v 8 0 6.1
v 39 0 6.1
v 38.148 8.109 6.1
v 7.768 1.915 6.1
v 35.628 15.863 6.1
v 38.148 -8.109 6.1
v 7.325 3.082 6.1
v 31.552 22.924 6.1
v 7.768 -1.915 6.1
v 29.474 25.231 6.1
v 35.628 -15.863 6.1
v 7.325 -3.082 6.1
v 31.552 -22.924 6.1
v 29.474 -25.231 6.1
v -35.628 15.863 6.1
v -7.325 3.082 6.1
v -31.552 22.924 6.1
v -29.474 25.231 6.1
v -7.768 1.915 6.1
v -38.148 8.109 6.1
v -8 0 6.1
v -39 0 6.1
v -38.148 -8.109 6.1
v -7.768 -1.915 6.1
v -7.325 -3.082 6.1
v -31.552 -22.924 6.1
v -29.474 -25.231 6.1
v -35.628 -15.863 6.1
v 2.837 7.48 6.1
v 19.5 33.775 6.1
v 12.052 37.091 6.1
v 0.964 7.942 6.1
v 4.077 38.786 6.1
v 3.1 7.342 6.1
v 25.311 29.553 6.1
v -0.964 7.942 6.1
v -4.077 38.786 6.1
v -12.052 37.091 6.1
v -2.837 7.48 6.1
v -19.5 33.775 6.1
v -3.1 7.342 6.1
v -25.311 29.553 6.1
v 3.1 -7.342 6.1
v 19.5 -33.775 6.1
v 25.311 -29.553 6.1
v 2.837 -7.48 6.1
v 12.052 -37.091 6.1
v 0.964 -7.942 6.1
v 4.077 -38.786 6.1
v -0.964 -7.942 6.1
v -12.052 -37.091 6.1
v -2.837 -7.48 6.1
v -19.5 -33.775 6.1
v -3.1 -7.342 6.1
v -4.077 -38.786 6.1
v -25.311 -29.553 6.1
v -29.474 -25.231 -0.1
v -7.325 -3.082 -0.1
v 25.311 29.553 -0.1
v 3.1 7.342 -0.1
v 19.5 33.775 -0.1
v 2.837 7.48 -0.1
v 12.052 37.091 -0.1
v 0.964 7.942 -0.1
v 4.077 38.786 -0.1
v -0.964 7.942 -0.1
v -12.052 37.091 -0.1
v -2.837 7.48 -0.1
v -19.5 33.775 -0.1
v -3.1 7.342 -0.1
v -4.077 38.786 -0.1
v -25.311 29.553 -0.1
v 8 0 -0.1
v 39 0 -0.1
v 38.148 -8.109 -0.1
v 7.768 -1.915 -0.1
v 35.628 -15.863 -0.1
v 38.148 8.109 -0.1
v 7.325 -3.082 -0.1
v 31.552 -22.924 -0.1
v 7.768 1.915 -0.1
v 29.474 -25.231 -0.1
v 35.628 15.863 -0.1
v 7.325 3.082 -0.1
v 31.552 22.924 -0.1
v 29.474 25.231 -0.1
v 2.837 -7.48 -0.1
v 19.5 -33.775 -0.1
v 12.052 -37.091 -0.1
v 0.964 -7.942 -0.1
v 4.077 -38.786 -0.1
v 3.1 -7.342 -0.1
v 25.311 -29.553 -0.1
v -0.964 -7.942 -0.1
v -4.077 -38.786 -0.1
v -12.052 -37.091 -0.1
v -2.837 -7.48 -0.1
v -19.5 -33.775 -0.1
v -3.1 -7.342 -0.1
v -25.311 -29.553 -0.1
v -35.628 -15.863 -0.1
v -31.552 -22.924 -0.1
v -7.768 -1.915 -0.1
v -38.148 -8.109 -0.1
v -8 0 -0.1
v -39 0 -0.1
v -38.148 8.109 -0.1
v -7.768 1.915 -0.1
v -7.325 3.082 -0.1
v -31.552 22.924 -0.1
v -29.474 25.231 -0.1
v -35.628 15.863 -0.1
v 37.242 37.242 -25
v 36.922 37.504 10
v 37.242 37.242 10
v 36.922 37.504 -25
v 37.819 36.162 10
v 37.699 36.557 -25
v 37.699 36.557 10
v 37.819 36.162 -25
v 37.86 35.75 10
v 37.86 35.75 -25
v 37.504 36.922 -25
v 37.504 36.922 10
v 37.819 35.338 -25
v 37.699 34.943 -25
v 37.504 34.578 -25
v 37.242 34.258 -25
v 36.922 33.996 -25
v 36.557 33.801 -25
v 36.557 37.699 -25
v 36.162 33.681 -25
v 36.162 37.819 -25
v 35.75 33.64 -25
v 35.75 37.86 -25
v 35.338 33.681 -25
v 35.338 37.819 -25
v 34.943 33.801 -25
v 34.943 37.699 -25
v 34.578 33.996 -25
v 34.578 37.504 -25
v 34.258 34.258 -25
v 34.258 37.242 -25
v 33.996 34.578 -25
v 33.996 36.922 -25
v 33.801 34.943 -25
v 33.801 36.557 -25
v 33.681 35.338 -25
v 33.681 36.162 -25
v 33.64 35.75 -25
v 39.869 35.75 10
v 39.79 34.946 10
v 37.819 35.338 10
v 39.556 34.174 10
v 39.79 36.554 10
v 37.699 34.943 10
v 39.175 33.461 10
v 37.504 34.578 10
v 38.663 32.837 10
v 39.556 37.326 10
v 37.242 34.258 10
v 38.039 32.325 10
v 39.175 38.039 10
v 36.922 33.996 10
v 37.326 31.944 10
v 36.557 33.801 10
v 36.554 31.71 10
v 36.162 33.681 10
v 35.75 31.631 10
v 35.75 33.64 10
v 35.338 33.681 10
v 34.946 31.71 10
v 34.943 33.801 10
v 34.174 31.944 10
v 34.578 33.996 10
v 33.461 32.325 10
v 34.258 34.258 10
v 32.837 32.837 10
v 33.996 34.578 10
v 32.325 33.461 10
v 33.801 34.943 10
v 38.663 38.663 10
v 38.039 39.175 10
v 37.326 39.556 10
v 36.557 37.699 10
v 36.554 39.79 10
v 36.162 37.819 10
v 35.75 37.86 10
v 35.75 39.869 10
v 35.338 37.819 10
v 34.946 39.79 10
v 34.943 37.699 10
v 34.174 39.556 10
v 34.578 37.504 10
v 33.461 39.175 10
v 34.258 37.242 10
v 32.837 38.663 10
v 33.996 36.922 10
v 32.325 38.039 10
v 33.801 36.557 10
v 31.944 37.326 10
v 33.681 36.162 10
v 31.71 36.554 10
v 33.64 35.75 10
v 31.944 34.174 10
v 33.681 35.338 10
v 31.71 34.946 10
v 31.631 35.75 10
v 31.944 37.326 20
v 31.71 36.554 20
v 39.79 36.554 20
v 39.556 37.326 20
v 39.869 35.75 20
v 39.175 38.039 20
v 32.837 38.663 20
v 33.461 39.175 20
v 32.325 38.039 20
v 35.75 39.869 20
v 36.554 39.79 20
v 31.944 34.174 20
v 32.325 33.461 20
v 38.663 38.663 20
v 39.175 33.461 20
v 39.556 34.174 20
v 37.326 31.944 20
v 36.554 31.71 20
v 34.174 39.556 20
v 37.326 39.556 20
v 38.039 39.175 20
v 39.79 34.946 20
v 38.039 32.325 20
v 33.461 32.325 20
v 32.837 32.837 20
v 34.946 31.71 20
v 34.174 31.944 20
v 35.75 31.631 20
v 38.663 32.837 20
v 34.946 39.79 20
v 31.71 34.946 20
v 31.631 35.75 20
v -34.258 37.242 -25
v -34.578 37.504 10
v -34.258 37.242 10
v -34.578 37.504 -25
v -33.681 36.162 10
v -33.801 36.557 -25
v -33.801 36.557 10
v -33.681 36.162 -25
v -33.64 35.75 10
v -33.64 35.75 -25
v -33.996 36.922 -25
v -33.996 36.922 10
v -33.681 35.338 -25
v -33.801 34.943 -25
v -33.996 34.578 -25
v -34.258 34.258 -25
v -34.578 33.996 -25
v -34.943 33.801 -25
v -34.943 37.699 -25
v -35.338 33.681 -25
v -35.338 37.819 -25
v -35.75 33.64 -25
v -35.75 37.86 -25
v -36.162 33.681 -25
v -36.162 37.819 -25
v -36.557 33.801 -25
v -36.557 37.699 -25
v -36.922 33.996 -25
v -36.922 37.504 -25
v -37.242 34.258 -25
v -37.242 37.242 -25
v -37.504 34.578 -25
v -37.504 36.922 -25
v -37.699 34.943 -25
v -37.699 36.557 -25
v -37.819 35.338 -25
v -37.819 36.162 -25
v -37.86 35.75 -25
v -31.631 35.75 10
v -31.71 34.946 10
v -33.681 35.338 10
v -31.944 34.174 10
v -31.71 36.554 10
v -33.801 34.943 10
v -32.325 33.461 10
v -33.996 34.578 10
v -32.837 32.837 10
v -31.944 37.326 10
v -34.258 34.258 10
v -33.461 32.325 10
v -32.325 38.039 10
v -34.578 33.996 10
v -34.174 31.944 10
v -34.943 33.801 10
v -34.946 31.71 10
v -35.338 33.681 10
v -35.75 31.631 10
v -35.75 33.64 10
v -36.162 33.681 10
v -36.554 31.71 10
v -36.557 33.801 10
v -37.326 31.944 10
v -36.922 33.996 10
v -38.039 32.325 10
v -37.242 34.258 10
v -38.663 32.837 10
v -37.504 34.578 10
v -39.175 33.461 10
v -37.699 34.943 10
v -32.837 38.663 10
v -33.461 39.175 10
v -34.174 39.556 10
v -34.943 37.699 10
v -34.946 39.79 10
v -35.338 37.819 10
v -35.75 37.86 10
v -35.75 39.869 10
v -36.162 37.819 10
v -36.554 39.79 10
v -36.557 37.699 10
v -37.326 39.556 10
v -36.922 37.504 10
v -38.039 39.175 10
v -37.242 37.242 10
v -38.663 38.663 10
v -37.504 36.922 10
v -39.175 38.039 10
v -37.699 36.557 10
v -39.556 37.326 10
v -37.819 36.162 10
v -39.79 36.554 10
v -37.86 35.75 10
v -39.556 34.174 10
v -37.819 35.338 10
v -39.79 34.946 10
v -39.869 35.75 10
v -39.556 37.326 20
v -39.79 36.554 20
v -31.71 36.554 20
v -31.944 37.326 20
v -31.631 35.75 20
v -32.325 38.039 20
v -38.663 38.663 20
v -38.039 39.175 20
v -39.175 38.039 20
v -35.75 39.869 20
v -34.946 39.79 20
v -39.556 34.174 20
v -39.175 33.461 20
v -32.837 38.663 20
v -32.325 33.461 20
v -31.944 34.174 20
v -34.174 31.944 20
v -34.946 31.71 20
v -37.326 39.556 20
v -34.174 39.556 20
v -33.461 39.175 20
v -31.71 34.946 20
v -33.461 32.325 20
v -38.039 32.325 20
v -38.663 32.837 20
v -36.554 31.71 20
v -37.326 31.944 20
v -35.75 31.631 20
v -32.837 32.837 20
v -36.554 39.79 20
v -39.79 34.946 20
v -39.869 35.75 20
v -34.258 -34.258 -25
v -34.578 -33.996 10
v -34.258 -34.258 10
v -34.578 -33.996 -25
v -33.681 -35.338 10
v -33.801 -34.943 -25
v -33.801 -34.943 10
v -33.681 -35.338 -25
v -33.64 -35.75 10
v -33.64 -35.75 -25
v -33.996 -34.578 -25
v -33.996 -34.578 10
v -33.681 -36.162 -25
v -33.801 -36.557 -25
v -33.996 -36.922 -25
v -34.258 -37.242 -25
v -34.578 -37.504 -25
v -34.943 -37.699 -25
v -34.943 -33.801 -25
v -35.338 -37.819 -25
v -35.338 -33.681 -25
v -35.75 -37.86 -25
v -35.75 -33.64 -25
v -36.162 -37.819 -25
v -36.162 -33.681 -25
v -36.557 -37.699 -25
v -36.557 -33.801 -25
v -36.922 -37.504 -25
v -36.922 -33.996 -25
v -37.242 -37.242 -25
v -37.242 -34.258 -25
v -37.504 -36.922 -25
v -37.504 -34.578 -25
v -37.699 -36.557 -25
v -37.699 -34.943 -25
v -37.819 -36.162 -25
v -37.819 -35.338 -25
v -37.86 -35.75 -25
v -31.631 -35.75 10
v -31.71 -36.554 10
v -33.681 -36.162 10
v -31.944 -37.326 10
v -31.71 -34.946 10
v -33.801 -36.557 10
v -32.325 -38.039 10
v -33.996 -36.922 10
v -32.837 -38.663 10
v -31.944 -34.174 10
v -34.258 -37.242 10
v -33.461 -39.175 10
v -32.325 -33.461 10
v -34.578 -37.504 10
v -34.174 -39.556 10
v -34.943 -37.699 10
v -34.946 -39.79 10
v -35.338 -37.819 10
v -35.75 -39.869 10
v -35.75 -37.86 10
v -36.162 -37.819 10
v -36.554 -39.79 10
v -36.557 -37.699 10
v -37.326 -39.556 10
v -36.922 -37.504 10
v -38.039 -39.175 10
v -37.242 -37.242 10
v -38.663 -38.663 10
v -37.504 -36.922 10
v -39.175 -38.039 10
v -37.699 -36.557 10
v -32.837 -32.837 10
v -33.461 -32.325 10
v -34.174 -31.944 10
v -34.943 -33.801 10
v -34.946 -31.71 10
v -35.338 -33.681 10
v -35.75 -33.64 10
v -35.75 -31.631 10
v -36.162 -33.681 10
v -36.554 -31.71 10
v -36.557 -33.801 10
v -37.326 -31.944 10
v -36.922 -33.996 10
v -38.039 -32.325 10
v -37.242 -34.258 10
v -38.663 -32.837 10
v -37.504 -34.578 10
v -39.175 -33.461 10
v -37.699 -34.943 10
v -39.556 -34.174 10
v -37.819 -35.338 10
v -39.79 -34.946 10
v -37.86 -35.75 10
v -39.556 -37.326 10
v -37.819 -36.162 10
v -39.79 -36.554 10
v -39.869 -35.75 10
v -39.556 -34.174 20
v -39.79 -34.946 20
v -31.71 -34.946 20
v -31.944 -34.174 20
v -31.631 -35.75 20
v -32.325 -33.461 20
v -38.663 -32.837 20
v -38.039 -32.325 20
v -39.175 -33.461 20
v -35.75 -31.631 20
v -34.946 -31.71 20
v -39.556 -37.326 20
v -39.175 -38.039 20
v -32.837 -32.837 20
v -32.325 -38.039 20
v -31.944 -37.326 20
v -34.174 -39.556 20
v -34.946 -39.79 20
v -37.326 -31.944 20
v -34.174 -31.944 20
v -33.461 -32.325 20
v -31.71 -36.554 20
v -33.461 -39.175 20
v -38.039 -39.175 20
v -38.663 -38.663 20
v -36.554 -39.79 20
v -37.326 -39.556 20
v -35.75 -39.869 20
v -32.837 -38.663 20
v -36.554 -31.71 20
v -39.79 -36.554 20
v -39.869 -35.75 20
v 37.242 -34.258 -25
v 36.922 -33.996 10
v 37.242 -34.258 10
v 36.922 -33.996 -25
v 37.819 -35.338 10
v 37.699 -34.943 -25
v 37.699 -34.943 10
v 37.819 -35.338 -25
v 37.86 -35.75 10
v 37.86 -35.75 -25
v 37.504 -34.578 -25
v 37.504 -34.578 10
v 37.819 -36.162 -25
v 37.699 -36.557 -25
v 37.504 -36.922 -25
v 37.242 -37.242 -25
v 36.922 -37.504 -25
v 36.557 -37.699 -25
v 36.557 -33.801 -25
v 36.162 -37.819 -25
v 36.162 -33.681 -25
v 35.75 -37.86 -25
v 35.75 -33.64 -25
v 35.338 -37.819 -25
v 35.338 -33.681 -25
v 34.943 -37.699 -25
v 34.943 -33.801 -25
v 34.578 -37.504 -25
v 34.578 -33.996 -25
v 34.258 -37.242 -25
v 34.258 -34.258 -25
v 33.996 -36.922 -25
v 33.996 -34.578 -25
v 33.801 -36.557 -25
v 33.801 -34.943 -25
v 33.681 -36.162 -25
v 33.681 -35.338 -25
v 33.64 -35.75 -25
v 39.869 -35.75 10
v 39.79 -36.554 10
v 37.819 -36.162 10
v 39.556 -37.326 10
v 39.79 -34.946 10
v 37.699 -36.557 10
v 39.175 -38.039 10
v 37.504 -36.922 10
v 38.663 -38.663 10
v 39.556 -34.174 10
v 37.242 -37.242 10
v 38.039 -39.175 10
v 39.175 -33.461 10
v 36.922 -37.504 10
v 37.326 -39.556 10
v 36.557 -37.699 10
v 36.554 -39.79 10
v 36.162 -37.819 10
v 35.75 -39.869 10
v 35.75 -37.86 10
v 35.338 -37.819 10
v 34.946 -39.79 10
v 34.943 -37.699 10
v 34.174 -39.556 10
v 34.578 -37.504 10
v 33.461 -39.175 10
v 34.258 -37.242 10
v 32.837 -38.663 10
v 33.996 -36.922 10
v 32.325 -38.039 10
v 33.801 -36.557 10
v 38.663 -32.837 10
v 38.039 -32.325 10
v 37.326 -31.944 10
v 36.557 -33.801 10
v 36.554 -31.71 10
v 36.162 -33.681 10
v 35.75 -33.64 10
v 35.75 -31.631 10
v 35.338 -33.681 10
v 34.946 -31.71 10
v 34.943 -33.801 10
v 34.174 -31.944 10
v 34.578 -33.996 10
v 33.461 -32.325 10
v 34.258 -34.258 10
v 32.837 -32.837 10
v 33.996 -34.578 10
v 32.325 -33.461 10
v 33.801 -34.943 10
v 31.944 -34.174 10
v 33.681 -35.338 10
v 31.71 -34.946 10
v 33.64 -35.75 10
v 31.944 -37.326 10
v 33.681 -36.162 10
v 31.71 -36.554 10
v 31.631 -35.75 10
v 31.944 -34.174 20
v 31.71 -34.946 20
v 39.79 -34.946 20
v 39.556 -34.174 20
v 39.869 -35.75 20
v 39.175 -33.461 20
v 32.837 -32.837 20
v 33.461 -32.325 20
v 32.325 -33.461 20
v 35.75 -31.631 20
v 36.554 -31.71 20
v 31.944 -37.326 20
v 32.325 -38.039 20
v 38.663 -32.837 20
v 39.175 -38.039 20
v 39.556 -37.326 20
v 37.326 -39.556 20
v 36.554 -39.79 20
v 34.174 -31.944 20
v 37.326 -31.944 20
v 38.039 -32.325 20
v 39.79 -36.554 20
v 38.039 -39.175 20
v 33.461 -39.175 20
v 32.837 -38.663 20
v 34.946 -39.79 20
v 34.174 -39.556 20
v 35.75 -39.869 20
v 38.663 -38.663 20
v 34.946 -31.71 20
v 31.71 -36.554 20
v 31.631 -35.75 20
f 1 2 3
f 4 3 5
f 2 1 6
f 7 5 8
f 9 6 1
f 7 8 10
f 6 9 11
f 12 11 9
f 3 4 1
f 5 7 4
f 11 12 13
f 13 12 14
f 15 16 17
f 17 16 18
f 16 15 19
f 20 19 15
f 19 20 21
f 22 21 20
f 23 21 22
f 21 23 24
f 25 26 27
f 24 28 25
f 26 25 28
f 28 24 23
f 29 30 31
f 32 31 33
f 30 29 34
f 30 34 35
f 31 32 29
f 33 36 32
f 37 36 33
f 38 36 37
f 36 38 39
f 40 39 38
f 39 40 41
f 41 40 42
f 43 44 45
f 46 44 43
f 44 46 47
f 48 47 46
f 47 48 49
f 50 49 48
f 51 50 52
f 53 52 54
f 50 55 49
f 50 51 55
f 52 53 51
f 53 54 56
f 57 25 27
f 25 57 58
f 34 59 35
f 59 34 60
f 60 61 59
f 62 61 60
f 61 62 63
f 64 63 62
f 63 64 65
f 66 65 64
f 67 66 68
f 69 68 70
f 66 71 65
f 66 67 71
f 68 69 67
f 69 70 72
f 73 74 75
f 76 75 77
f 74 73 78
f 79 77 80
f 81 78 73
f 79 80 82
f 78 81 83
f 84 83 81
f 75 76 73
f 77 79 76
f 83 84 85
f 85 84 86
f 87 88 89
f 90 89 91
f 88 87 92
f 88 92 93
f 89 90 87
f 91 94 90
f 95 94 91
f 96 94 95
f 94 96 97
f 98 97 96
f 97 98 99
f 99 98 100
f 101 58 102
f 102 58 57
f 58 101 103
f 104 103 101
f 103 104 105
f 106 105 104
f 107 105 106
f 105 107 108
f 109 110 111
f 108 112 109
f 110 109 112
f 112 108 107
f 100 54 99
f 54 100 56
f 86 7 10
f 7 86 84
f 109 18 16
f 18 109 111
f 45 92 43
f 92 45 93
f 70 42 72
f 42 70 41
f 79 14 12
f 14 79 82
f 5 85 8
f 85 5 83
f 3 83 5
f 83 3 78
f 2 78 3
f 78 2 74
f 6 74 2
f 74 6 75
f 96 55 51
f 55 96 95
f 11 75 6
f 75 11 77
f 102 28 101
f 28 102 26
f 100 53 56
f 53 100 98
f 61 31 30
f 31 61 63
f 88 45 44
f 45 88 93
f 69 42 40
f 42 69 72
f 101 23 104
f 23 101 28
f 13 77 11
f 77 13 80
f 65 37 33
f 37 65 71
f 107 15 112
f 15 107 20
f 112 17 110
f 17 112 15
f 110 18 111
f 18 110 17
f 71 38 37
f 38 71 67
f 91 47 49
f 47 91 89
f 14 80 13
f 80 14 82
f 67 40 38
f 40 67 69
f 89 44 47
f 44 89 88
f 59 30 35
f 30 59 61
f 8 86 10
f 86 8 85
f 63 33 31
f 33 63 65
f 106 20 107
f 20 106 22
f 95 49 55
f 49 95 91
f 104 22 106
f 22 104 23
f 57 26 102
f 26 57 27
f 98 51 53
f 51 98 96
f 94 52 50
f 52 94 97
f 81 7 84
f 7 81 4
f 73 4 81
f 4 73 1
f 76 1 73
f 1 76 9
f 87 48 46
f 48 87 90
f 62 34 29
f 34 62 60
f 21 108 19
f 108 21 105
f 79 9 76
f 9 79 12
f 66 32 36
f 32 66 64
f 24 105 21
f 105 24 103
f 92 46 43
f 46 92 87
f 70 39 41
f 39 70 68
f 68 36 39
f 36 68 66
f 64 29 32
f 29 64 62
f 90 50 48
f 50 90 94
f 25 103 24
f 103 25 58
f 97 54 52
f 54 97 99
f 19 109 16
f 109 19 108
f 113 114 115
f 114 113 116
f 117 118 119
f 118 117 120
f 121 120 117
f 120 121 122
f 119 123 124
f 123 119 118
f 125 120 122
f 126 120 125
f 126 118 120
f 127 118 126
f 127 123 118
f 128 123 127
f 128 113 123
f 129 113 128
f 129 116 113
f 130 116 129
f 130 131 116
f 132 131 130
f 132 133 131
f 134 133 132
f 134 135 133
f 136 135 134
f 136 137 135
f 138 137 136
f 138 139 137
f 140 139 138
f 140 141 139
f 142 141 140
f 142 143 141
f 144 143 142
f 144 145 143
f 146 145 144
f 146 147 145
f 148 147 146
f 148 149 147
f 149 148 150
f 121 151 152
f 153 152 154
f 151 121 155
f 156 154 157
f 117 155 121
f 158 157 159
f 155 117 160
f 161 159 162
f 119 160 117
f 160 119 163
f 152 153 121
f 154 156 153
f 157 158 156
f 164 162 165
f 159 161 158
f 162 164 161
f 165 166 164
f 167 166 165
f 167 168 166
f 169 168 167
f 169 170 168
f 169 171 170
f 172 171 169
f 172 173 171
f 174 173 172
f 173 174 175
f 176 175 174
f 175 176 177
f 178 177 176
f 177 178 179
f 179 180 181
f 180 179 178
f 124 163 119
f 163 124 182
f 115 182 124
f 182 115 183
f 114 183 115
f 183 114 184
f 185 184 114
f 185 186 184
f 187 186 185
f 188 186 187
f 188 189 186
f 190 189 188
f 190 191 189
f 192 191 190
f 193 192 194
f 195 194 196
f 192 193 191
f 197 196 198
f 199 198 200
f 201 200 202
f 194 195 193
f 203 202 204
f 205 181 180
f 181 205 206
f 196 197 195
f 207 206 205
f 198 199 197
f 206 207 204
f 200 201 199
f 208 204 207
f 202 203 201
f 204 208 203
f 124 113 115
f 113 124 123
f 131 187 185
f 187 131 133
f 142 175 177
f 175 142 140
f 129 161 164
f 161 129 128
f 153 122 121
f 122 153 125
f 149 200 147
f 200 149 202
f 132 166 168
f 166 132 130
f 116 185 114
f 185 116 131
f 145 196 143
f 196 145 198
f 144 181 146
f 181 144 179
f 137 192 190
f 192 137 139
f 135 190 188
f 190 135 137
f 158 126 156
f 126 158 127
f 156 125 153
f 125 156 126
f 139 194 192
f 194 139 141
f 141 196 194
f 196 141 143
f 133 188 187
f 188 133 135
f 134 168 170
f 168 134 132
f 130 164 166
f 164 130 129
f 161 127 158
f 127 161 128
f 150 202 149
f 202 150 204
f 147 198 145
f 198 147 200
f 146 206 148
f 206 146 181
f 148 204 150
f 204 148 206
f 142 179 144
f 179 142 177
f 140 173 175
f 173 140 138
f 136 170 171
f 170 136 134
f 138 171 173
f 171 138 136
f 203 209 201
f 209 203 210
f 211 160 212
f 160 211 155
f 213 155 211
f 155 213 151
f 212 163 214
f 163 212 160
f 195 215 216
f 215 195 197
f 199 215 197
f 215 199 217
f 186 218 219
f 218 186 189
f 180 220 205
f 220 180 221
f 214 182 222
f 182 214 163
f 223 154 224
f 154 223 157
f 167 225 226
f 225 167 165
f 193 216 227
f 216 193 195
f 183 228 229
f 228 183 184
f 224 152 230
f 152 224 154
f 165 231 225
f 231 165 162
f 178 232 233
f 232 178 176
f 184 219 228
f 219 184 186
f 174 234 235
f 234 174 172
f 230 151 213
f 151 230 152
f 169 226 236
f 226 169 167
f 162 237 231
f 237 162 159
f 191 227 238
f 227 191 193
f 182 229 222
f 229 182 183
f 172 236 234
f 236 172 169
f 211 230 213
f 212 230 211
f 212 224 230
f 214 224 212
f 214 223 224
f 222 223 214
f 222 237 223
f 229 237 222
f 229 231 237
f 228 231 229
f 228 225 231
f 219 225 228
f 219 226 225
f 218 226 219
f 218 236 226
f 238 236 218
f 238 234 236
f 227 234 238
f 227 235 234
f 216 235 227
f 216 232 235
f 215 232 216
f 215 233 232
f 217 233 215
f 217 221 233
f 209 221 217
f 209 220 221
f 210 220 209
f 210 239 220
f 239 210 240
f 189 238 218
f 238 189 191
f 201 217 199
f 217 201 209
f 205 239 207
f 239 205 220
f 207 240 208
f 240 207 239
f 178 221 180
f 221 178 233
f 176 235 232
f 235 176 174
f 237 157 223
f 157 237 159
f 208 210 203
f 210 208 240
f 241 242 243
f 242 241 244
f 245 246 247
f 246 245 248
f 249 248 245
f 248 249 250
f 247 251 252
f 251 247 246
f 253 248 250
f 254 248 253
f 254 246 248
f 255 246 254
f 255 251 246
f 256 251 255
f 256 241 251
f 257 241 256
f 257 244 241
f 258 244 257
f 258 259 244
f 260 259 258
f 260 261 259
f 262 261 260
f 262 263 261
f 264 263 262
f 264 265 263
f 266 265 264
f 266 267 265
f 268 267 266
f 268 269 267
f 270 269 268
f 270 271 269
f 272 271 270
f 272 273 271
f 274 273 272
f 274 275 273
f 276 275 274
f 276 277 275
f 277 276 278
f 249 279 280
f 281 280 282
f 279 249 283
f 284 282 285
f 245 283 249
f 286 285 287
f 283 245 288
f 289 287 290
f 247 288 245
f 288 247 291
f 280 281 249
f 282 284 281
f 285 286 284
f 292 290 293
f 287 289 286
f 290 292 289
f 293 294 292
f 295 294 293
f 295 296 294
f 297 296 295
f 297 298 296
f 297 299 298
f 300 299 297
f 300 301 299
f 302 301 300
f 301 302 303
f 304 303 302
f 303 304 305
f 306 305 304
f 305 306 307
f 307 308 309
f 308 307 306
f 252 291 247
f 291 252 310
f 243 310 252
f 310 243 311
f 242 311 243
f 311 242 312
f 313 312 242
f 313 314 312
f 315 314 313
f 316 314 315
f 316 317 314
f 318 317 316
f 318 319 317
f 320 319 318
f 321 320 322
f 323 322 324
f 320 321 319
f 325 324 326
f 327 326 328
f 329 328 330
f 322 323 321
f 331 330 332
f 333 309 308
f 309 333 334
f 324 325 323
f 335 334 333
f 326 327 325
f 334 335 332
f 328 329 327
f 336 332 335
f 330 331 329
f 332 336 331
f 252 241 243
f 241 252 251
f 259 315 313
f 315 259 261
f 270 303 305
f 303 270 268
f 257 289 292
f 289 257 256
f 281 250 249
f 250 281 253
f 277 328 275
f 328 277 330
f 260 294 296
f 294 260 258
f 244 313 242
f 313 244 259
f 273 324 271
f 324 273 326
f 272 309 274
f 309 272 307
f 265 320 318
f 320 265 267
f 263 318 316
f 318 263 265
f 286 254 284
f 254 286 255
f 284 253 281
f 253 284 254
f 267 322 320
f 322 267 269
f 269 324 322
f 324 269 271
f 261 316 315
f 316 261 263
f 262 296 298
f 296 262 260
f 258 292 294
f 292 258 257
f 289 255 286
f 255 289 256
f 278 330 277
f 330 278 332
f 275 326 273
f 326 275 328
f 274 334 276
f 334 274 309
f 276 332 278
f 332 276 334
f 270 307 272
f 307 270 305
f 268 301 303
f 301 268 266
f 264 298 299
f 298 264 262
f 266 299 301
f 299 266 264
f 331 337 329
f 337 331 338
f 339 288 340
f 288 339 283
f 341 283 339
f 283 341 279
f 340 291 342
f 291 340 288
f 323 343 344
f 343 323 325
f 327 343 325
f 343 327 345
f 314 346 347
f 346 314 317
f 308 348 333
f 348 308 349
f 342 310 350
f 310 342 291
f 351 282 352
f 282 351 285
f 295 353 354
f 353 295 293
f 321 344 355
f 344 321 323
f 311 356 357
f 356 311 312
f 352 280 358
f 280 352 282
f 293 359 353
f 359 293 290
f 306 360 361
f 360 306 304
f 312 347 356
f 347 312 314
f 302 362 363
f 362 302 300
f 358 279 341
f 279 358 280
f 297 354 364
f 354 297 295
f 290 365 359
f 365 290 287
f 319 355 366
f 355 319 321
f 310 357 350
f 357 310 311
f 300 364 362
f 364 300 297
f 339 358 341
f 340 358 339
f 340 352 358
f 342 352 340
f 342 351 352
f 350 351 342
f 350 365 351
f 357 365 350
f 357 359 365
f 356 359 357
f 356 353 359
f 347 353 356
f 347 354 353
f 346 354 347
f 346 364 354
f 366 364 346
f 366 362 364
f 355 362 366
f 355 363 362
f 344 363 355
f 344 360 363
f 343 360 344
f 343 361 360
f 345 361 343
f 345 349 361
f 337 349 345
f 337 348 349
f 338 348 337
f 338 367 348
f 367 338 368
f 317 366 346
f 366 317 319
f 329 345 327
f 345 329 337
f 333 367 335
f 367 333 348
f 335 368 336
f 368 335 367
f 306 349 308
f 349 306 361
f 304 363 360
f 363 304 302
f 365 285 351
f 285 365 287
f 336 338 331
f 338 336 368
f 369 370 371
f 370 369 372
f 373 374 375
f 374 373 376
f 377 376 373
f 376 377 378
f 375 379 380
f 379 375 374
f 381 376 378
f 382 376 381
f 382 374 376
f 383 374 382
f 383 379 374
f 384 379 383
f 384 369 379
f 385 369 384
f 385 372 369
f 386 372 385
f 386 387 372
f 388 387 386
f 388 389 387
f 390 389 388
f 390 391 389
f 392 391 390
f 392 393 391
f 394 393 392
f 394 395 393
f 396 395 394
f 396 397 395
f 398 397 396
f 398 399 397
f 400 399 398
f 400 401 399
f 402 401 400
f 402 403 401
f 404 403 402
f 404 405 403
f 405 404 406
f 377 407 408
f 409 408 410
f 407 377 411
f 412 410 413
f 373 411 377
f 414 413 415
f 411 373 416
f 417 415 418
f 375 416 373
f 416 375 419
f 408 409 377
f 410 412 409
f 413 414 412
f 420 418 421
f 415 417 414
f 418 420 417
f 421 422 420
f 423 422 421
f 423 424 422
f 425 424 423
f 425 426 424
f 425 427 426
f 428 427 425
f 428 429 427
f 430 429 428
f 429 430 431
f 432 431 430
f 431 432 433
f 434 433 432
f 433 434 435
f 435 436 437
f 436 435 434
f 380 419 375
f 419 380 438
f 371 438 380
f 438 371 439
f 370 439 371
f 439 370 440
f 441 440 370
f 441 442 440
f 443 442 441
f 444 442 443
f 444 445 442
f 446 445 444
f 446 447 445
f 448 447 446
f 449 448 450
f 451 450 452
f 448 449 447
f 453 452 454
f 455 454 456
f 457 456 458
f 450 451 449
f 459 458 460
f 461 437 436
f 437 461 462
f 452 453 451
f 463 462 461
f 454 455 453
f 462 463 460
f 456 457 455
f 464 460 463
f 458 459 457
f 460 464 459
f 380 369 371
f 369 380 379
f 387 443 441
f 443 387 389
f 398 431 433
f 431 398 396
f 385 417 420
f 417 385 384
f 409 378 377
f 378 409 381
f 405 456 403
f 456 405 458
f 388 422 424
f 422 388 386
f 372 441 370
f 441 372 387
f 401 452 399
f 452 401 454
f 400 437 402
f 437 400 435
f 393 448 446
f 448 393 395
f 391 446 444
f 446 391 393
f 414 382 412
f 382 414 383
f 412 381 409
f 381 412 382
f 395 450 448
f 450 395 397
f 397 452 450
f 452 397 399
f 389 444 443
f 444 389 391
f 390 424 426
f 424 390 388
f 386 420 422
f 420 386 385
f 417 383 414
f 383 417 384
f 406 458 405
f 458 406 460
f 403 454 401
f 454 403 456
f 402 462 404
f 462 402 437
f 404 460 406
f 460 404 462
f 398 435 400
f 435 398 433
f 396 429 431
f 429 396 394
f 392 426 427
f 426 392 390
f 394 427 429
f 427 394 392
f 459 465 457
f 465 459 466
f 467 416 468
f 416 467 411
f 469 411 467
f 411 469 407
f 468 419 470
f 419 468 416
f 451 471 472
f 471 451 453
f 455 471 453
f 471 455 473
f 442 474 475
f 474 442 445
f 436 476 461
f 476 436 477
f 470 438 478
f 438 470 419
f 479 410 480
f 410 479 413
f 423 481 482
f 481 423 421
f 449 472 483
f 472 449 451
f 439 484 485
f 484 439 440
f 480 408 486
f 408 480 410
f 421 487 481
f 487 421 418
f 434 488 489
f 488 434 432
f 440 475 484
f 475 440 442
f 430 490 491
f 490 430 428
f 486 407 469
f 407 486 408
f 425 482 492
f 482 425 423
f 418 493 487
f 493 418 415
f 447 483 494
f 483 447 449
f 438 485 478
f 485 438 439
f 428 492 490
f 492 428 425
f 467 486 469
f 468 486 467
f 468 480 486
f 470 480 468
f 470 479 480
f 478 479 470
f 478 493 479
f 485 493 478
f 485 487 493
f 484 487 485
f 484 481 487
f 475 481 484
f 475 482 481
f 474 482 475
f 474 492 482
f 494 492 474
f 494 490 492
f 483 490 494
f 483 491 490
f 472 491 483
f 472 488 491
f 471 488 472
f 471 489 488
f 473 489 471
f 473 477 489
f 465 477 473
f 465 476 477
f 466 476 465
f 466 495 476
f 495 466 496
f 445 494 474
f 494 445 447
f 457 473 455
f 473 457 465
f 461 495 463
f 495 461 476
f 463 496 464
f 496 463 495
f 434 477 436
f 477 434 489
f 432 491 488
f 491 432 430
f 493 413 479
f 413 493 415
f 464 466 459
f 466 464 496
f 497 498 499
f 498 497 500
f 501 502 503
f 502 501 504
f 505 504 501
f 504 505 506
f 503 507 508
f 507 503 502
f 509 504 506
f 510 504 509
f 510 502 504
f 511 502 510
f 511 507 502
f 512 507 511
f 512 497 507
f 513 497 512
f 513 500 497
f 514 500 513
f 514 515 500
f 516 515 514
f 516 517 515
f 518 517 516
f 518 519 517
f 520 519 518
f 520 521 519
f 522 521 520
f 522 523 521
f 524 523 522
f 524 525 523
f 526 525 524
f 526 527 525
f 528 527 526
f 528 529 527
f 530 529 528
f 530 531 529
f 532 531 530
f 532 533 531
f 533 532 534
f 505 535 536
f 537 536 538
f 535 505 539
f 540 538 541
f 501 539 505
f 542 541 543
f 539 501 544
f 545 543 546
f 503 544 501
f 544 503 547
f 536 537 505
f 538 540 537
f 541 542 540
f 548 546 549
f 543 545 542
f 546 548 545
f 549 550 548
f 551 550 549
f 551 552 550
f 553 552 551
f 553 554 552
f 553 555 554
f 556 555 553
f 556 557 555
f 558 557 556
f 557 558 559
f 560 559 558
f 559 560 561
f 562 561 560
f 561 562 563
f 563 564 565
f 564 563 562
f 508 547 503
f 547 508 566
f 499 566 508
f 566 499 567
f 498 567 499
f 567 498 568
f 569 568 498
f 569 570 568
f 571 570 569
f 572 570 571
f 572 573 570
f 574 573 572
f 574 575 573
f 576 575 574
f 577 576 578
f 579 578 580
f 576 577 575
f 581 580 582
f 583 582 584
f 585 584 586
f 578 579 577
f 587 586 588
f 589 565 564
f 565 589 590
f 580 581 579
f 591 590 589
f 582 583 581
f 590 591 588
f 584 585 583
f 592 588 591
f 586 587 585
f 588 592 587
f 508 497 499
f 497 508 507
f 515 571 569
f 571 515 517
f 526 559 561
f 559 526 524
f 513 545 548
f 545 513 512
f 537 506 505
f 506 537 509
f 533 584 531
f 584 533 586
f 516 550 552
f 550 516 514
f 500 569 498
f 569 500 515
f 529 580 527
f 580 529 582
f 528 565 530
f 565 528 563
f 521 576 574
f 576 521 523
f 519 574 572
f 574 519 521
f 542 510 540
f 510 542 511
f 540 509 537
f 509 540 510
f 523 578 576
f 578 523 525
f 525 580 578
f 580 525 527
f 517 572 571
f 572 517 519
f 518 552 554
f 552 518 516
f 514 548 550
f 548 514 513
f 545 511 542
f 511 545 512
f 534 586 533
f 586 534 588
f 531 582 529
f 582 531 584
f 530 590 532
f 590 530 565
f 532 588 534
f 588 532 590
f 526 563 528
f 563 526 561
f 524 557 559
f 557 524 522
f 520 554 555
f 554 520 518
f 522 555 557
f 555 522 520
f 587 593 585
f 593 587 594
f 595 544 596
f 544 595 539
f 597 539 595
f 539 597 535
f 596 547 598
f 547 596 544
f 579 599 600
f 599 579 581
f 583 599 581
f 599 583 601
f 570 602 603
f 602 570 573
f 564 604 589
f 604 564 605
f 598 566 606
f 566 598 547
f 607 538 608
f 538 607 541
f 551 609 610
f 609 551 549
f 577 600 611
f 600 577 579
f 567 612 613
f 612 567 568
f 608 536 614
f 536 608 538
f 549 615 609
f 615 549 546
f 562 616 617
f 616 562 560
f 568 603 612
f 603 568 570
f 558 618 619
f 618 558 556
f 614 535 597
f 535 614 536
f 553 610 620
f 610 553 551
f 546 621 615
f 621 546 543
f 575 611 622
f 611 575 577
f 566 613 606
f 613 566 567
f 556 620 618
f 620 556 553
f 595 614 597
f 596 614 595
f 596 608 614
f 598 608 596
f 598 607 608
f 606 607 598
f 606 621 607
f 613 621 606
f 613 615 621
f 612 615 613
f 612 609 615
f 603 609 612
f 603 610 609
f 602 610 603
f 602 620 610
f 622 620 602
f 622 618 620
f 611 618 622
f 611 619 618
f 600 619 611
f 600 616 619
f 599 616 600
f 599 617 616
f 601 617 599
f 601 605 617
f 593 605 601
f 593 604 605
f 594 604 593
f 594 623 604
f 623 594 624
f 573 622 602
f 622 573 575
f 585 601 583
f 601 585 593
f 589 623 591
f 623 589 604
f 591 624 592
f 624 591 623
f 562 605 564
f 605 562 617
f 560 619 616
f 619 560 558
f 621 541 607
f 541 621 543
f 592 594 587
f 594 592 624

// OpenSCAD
// file: zcube.scad
// This function creates a cube with a given x/y either above (f=1) or below (f=-1) the z axis.
module zcube(dimensions, z=0, f=1) {
	translate([0, 0, dimensions[2]/2 * f + z]) cube(dimensions, true);
}

module zring(dimensions, thickness, z=0, f=1) {
	render() difference() {
		zcube([dimensions[0]+thickness/2, dimensions[1]+thickness/2, dimensions[2]], z=z, f=f);
		zcube([dimensions[0]-thickness/2, dimensions[1]-thickness/2, dimensions[2]], z=z, f=f);
	}
}

module rcube(dimensions, d = 1, z=0, f=1) {
	dx = dimensions[0]/2 - d/2;
	dy = dimensions[1]/2 - d/2;
	dz = dimensions[2]/2 * (f-1) + z;
	
	hull() {
		translate([-dx, -dy, dz]) cylinder(h=dimensions[2], d=d);
		translate([-dx, dy, dz]) cylinder(h=dimensions[2], d=d);
		translate([dx, -dy, dz]) cylinder(h=dimensions[2], d=d);
		translate([dx, dy, dz]) cylinder(h=dimensions[2], d=d);
	}
}

module zcorners() {
	children();
	mirror([1, 0, 0]) children();
	mirror([0, 1, 0]) children();
	mirror([1, 0, 0]) mirror([0, 1, 0]) children();
}

module reflect(axis = [1, 0, 0]) {
	children();
	mirror(axis) children();
}

module zsides(dimensions, thickness, inset=0) {
	reflect([1, 0, 0]) {
		translate([thickness/2+dimensions[0]/2, 0, dimensions[2]/2]) cube([thickness, dimensions[1]-inset*2, dimensions[2]], true);
	}
	
	reflect([0, 1, 0]) {
		translate([0, thickness/2+dimensions[1]/2, dimensions[2]/2]) cube([dimensions[0]-inset*2, thickness, dimensions[2]], true);
	}
}
// file: bolts.scad
$radial_error = 0.1;
$fn = 8*4;

ISO262_COARSE_PITCH = [
	[1.0, 0.25],
	[1.2, 0.25],
	[1.4, 0.2],
	[1.6, 0.35],
	[1.8, 0.2],
	[2.0, 0.4],
	[2.5, 0.45],
	[3.0, 0.5],
	[3.5, 0.35],
	[4.0, 0.7],
	[5.0, 0.8],
	[6.0, 1.0],
	[7.0, 0.75],
	[8.0, 1.25],
	[10.0, 1.5],
	[12.0, 1.75],
	[14.0, 1.5],
	[16.0, 2.0],
	[30.0, 3.5],
	[42.0, 4.5],
	[56.0, 5.5]
];

function screw_pitch(d) = lookup(d, ISO262_COARSE_PITCH);

module cylinder_outer(height, radius, fn=$fn, radial_error=$radial_error) {
	fudge = 1/cos(180/fn);
	cylinder(h=height,r=radius*fudge+$radial_error, $fn=fn);
}

module cylinder_inner(height, radius, fn=$fn) {
	cylinder(h=height,r=radius-$radial_error,$fn=fn);
}

// Make a hole. The diameter is the size of the screw (e.g. 3 for M3). Depth is how far the hole should go for the thread, and inset is how far out there should be a hole for the head to go.
module hole(diameter=3, depth=6, inset=10, pitch=0) {
	cylinder_outer(depth, (diameter-pitch)/2);
	translate([0, 0, depth]) cylinder_outer(inset, diameter, 32);
}

module threaded_hole(diameter=3, depth=6, inset=10) {
	hole(diameter, depth, inset, screw_pitch(diameter));
}

module countersunk_hole(diameter=3, depth=6, inset=10, pitch=0) {
	hole(diameter, depth, inset, pitch);
	translate([0, 0, depth-diameter/2]) cylinder(r1=diameter/2+$radial_error, r2=diameter+$radial_error, h=diameter/2);
}

module knurled_insert(diameter = 3, depth = 6, thickness = 1) {
	cylinder_inner(depth, diameter/2 + thickness);
}

module knurled_hole(diameter = 3, depth = 6, inset = 10, insert = 4, thickness = 1) {
	hole(diameter, depth, inset);
	
	knurled_insert(diameter, insert, thickness);
}

module countersunk_knurled_hole(diameter = 3, depth = 6, inset = 10, insert = 4, thickness = 1) {
	countersunk_hole(diameter, depth, inset);
	
	knurled_insert(diameter, insert, thickness);
}

// Make a hole for a bolt/screw combination.
module bolted_hole(diameter=3, depth=8, nut_offset=2, shaft_length=10, inset=10) {
	hole(diameter, depth, inset);
	hull() {
		shaft_width = diameter;
		translate([0, 0, nut_offset]) rotate(360/12, [0, 0, 1]) cylinder_outer(diameter, shaft_width, 6);
		translate([0, shaft_length, nut_offset]) rotate(360/12, [0, 0, 1]) cylinder_outer(diameter, shaft_width, 6);
	}
}

module countersunk_bolted_hole(diameter=3, depth=8, nut_offset=2, shaft_length=10, inset=10) {
	countersunk_hole(diameter, depth, inset);
	hull() {
		shaft_width = diameter;
		translate([0, 0, nut_offset]) rotate(360/12, [0, 0, 1]) cylinder_outer(diameter, shaft_width, 6);
		translate([0, shaft_length, nut_offset]) rotate(360/12, [0, 0, 1]) cylinder_outer(diameter, shaft_width, 6);
	}
}

module mounting_hole(diameter=3, depth=6, inset=10, outset=3) {
	difference() {
		cylinder_outer(depth, diameter/2+outset);
		hole(diameter=diameter, depth=depth, inset=inset);
	}
}

render() rotate(90, [1, 0, 0]) difference() {
	cube([40, 10, 10]);
	translate([5, 5, 0]) bolted_hole(diameter=3, depth=8);
	translate([15, 5, 0]) bolted_hole(diameter=4, depth=8);
	translate([25, 5, 0]) countersunk_hole(diameter=4, depth=8);
	translate([35, 5, 0]) knurled_hole();
}
// main file
use <bolts.scad>;
use <zcube.scad>;

SPACING = [
	[40, 32],
	[50, 40],
	[60, 50],
	[70, 60],
	[80, 71.5],
	[92, 82.5],
	[120, 105],
	[140, 124.5],
	[200, 154],
	[220, 170]
];

function screw_spacing(d) = lookup(d, SPACING);

module fan(diameter = 140, thickness = 25) {
	difference() {
		translate([-diameter/2, -diameter/2, -thickness]) color("blue") cube([diameter, diameter, thickness]);
		translate([0, 0, -thickness-1]) cylinder(d=diameter, h=thickness+2);
	}
}

module fan_holes(diameter = 140, z = 10) {
	spacing = screw_spacing(diameter);
	outset = spacing / 2;
	
	translate([outset, outset, z]) children();
	translate([-outset, outset, z]) children();
	translate([-outset, -outset, z]) children();
	translate([outset, -outset, z]) children();
}

module fan_cutout(diameter = 140, thickness = 6, inset = 2, spacing = 124.5) {
	render() {
		translate([0, 0, -0.1]) difference() {
			cylinder(h = thickness+0.2, r = (diameter - inset)/2);
			
			for (r = [45:90:180]) {
				rotate([0, 0, r]) zcube([diameter, 6, thickness+0.2]);
			}
			
			cylinder(h = thickness+0.2, r = diameter/10);
		}
		
		/* translate([0, 0, wall]) zcorners() hull() {
			translate([-spacing/2, -spacing/2, 0]) cylinder_outer(thickness-wall+0.1, (diameter-spacing)/2);
			cylinder_outer(thickness-wall+0.1, diameter/5);
		} */
		
		// The screw is M3, but we make the hole M4 so it won't hold a thread.
		fan_holes(diameter) translate([0, 0, -35]) hole(4, 35);
	}
}

//color("brown") fan();
//#fan_holes() translate([0, 0, -35]) hole(3, 35);
fan_cutout(80);
